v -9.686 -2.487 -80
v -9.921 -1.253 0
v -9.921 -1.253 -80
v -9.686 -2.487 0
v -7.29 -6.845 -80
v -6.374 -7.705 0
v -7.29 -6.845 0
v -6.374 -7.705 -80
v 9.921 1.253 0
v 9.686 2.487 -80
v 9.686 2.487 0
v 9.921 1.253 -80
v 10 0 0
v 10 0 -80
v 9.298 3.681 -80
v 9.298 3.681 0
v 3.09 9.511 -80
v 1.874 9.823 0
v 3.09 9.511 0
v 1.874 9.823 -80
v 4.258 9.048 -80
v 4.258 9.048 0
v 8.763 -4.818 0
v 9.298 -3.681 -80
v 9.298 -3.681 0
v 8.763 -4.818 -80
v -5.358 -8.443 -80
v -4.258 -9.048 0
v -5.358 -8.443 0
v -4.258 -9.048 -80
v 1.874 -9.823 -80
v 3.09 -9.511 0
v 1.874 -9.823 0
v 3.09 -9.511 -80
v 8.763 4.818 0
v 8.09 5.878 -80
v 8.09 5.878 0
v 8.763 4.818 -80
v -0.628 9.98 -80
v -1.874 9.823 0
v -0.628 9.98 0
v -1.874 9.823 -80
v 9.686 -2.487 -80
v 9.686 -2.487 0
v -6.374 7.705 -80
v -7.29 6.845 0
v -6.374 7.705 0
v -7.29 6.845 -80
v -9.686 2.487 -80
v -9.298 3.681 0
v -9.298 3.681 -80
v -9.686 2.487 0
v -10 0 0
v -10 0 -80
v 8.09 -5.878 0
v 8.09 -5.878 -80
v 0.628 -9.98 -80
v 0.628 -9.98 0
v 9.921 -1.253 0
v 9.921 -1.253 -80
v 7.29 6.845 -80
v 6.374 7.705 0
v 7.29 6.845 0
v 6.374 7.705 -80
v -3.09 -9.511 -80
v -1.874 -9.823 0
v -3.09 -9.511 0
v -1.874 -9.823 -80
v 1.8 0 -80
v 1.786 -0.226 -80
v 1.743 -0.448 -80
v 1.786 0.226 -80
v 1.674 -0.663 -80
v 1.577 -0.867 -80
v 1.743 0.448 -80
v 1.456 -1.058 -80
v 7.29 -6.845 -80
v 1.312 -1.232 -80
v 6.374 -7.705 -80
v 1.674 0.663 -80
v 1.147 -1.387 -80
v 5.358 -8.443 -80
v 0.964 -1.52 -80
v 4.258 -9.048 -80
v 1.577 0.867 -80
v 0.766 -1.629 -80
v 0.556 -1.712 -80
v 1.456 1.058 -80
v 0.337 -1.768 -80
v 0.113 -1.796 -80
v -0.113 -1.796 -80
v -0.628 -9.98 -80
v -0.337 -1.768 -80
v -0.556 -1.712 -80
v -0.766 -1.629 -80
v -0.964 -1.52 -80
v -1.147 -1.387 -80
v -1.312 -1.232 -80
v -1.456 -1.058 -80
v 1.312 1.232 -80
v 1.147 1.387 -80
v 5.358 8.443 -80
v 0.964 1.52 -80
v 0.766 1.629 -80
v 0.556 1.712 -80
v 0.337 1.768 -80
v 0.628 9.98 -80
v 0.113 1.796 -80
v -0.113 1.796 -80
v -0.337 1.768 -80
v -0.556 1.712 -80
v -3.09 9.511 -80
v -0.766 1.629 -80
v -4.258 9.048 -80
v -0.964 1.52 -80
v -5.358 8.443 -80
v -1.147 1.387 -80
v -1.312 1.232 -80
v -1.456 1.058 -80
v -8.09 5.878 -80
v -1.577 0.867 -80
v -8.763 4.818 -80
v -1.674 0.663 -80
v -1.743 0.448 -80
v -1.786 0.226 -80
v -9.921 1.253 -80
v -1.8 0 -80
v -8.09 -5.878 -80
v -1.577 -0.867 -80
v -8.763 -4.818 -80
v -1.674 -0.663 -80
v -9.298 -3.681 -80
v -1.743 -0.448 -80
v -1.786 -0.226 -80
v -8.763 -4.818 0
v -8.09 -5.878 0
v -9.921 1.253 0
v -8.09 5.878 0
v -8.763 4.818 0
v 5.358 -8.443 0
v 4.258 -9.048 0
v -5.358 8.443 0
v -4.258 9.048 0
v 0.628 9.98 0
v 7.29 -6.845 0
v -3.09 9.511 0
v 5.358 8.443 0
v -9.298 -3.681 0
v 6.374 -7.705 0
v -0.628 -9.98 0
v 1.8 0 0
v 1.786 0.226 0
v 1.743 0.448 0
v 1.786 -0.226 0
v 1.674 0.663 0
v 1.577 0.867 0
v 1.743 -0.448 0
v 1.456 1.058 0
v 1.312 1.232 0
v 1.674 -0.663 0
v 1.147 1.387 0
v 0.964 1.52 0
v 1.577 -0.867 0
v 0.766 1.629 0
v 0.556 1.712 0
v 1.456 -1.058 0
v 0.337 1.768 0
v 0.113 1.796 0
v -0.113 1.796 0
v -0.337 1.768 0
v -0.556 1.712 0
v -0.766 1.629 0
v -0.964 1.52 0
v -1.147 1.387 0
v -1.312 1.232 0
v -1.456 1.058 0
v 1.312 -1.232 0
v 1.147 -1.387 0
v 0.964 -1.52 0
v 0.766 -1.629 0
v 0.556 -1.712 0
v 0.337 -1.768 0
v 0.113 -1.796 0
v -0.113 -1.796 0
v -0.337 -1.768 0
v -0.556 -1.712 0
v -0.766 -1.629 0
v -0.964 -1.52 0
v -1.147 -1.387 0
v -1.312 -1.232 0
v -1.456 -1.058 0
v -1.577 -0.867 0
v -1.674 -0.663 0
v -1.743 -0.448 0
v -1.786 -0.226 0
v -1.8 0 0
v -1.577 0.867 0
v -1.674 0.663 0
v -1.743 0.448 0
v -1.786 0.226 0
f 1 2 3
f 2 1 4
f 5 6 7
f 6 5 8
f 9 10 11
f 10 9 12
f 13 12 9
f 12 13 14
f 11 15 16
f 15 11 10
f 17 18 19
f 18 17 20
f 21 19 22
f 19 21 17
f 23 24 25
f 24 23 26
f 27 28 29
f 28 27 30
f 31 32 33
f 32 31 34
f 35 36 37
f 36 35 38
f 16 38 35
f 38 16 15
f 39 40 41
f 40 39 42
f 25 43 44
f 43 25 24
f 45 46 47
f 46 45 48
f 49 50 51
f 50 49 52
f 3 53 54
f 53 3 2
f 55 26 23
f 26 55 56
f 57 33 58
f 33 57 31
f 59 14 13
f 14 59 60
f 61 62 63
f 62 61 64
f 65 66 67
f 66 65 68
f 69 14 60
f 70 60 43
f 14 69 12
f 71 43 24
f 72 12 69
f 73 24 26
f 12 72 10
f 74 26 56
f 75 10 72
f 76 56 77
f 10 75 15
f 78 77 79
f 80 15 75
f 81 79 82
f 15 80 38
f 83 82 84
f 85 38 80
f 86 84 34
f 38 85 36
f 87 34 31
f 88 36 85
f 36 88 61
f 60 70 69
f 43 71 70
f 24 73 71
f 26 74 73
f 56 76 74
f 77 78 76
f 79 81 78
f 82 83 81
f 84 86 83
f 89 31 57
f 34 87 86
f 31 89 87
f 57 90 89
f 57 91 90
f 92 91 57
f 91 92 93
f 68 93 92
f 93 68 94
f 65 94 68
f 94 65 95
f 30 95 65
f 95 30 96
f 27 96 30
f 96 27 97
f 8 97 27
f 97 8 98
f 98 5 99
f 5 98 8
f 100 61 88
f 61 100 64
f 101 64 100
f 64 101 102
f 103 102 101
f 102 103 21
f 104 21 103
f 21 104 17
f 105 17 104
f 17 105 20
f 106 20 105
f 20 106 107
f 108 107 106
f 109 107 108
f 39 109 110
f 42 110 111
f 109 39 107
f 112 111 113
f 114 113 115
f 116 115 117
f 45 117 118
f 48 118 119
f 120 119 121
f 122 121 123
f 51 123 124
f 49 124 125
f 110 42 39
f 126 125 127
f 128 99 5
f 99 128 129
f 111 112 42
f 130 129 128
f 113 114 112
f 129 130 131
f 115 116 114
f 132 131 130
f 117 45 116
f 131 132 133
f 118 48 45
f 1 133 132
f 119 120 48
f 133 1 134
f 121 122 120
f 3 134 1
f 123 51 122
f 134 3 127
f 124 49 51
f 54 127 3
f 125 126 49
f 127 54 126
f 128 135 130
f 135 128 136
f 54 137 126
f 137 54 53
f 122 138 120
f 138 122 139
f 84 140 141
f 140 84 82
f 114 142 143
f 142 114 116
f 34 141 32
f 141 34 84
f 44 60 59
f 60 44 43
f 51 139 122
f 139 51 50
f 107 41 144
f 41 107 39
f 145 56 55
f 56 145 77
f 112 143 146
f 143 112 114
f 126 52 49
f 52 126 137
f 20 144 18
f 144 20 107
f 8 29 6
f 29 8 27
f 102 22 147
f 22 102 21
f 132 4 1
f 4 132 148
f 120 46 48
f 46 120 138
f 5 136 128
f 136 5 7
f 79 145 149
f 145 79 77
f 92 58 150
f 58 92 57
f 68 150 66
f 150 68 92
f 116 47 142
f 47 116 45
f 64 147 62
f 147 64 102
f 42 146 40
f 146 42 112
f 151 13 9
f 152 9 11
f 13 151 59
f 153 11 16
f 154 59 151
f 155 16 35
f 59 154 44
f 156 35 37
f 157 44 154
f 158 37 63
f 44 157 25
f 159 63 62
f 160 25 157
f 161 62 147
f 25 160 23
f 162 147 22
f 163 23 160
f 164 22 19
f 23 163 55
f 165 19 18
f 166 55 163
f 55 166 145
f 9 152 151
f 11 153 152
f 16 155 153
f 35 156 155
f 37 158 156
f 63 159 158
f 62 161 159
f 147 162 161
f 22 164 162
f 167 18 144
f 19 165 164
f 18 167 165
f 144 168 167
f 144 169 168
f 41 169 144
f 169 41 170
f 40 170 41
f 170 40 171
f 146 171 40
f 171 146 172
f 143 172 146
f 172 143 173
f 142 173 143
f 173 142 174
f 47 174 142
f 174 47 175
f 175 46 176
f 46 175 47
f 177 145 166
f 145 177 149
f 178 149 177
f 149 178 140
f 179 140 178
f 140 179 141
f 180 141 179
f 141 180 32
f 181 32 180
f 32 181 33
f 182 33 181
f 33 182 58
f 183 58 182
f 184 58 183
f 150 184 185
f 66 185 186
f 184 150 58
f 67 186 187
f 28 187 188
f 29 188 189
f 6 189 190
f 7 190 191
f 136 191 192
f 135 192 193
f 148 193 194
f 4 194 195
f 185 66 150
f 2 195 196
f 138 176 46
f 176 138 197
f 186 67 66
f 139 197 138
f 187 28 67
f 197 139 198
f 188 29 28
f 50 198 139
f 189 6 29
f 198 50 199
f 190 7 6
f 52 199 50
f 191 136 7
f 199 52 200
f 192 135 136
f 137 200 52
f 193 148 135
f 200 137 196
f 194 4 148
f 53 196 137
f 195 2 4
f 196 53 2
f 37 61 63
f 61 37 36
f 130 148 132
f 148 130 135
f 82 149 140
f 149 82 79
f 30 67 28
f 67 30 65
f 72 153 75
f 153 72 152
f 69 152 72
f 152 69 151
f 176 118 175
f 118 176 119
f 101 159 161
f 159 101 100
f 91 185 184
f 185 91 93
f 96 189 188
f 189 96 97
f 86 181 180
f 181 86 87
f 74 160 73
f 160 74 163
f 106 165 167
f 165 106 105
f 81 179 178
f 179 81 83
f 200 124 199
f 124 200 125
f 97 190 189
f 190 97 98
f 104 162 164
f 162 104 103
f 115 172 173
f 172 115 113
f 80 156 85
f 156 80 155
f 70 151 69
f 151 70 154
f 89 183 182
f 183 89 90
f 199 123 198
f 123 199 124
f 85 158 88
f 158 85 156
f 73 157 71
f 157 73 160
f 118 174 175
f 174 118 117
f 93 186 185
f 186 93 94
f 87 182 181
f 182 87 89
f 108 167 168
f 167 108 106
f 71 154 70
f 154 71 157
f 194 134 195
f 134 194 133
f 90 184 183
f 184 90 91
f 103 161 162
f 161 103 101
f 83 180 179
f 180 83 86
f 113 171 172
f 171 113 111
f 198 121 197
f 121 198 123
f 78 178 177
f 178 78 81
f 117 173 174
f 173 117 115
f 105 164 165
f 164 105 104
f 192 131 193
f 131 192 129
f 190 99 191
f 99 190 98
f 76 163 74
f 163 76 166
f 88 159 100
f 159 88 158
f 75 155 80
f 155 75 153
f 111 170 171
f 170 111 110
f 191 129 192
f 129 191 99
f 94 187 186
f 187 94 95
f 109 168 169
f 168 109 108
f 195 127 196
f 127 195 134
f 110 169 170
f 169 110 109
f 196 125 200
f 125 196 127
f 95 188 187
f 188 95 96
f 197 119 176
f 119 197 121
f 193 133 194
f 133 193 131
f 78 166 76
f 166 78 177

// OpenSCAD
$fn = 50;


difference() {
	union() {
		translate(v = [0, 0, -80.0000000000]) {
			cylinder(h = 80, r = 10.0000000000);
		}
	}
	union() {
		#translate(v = [0, 0, -80]) {
			cylinder(h = 80, r = 1.8000000000);
		}
	}
}
